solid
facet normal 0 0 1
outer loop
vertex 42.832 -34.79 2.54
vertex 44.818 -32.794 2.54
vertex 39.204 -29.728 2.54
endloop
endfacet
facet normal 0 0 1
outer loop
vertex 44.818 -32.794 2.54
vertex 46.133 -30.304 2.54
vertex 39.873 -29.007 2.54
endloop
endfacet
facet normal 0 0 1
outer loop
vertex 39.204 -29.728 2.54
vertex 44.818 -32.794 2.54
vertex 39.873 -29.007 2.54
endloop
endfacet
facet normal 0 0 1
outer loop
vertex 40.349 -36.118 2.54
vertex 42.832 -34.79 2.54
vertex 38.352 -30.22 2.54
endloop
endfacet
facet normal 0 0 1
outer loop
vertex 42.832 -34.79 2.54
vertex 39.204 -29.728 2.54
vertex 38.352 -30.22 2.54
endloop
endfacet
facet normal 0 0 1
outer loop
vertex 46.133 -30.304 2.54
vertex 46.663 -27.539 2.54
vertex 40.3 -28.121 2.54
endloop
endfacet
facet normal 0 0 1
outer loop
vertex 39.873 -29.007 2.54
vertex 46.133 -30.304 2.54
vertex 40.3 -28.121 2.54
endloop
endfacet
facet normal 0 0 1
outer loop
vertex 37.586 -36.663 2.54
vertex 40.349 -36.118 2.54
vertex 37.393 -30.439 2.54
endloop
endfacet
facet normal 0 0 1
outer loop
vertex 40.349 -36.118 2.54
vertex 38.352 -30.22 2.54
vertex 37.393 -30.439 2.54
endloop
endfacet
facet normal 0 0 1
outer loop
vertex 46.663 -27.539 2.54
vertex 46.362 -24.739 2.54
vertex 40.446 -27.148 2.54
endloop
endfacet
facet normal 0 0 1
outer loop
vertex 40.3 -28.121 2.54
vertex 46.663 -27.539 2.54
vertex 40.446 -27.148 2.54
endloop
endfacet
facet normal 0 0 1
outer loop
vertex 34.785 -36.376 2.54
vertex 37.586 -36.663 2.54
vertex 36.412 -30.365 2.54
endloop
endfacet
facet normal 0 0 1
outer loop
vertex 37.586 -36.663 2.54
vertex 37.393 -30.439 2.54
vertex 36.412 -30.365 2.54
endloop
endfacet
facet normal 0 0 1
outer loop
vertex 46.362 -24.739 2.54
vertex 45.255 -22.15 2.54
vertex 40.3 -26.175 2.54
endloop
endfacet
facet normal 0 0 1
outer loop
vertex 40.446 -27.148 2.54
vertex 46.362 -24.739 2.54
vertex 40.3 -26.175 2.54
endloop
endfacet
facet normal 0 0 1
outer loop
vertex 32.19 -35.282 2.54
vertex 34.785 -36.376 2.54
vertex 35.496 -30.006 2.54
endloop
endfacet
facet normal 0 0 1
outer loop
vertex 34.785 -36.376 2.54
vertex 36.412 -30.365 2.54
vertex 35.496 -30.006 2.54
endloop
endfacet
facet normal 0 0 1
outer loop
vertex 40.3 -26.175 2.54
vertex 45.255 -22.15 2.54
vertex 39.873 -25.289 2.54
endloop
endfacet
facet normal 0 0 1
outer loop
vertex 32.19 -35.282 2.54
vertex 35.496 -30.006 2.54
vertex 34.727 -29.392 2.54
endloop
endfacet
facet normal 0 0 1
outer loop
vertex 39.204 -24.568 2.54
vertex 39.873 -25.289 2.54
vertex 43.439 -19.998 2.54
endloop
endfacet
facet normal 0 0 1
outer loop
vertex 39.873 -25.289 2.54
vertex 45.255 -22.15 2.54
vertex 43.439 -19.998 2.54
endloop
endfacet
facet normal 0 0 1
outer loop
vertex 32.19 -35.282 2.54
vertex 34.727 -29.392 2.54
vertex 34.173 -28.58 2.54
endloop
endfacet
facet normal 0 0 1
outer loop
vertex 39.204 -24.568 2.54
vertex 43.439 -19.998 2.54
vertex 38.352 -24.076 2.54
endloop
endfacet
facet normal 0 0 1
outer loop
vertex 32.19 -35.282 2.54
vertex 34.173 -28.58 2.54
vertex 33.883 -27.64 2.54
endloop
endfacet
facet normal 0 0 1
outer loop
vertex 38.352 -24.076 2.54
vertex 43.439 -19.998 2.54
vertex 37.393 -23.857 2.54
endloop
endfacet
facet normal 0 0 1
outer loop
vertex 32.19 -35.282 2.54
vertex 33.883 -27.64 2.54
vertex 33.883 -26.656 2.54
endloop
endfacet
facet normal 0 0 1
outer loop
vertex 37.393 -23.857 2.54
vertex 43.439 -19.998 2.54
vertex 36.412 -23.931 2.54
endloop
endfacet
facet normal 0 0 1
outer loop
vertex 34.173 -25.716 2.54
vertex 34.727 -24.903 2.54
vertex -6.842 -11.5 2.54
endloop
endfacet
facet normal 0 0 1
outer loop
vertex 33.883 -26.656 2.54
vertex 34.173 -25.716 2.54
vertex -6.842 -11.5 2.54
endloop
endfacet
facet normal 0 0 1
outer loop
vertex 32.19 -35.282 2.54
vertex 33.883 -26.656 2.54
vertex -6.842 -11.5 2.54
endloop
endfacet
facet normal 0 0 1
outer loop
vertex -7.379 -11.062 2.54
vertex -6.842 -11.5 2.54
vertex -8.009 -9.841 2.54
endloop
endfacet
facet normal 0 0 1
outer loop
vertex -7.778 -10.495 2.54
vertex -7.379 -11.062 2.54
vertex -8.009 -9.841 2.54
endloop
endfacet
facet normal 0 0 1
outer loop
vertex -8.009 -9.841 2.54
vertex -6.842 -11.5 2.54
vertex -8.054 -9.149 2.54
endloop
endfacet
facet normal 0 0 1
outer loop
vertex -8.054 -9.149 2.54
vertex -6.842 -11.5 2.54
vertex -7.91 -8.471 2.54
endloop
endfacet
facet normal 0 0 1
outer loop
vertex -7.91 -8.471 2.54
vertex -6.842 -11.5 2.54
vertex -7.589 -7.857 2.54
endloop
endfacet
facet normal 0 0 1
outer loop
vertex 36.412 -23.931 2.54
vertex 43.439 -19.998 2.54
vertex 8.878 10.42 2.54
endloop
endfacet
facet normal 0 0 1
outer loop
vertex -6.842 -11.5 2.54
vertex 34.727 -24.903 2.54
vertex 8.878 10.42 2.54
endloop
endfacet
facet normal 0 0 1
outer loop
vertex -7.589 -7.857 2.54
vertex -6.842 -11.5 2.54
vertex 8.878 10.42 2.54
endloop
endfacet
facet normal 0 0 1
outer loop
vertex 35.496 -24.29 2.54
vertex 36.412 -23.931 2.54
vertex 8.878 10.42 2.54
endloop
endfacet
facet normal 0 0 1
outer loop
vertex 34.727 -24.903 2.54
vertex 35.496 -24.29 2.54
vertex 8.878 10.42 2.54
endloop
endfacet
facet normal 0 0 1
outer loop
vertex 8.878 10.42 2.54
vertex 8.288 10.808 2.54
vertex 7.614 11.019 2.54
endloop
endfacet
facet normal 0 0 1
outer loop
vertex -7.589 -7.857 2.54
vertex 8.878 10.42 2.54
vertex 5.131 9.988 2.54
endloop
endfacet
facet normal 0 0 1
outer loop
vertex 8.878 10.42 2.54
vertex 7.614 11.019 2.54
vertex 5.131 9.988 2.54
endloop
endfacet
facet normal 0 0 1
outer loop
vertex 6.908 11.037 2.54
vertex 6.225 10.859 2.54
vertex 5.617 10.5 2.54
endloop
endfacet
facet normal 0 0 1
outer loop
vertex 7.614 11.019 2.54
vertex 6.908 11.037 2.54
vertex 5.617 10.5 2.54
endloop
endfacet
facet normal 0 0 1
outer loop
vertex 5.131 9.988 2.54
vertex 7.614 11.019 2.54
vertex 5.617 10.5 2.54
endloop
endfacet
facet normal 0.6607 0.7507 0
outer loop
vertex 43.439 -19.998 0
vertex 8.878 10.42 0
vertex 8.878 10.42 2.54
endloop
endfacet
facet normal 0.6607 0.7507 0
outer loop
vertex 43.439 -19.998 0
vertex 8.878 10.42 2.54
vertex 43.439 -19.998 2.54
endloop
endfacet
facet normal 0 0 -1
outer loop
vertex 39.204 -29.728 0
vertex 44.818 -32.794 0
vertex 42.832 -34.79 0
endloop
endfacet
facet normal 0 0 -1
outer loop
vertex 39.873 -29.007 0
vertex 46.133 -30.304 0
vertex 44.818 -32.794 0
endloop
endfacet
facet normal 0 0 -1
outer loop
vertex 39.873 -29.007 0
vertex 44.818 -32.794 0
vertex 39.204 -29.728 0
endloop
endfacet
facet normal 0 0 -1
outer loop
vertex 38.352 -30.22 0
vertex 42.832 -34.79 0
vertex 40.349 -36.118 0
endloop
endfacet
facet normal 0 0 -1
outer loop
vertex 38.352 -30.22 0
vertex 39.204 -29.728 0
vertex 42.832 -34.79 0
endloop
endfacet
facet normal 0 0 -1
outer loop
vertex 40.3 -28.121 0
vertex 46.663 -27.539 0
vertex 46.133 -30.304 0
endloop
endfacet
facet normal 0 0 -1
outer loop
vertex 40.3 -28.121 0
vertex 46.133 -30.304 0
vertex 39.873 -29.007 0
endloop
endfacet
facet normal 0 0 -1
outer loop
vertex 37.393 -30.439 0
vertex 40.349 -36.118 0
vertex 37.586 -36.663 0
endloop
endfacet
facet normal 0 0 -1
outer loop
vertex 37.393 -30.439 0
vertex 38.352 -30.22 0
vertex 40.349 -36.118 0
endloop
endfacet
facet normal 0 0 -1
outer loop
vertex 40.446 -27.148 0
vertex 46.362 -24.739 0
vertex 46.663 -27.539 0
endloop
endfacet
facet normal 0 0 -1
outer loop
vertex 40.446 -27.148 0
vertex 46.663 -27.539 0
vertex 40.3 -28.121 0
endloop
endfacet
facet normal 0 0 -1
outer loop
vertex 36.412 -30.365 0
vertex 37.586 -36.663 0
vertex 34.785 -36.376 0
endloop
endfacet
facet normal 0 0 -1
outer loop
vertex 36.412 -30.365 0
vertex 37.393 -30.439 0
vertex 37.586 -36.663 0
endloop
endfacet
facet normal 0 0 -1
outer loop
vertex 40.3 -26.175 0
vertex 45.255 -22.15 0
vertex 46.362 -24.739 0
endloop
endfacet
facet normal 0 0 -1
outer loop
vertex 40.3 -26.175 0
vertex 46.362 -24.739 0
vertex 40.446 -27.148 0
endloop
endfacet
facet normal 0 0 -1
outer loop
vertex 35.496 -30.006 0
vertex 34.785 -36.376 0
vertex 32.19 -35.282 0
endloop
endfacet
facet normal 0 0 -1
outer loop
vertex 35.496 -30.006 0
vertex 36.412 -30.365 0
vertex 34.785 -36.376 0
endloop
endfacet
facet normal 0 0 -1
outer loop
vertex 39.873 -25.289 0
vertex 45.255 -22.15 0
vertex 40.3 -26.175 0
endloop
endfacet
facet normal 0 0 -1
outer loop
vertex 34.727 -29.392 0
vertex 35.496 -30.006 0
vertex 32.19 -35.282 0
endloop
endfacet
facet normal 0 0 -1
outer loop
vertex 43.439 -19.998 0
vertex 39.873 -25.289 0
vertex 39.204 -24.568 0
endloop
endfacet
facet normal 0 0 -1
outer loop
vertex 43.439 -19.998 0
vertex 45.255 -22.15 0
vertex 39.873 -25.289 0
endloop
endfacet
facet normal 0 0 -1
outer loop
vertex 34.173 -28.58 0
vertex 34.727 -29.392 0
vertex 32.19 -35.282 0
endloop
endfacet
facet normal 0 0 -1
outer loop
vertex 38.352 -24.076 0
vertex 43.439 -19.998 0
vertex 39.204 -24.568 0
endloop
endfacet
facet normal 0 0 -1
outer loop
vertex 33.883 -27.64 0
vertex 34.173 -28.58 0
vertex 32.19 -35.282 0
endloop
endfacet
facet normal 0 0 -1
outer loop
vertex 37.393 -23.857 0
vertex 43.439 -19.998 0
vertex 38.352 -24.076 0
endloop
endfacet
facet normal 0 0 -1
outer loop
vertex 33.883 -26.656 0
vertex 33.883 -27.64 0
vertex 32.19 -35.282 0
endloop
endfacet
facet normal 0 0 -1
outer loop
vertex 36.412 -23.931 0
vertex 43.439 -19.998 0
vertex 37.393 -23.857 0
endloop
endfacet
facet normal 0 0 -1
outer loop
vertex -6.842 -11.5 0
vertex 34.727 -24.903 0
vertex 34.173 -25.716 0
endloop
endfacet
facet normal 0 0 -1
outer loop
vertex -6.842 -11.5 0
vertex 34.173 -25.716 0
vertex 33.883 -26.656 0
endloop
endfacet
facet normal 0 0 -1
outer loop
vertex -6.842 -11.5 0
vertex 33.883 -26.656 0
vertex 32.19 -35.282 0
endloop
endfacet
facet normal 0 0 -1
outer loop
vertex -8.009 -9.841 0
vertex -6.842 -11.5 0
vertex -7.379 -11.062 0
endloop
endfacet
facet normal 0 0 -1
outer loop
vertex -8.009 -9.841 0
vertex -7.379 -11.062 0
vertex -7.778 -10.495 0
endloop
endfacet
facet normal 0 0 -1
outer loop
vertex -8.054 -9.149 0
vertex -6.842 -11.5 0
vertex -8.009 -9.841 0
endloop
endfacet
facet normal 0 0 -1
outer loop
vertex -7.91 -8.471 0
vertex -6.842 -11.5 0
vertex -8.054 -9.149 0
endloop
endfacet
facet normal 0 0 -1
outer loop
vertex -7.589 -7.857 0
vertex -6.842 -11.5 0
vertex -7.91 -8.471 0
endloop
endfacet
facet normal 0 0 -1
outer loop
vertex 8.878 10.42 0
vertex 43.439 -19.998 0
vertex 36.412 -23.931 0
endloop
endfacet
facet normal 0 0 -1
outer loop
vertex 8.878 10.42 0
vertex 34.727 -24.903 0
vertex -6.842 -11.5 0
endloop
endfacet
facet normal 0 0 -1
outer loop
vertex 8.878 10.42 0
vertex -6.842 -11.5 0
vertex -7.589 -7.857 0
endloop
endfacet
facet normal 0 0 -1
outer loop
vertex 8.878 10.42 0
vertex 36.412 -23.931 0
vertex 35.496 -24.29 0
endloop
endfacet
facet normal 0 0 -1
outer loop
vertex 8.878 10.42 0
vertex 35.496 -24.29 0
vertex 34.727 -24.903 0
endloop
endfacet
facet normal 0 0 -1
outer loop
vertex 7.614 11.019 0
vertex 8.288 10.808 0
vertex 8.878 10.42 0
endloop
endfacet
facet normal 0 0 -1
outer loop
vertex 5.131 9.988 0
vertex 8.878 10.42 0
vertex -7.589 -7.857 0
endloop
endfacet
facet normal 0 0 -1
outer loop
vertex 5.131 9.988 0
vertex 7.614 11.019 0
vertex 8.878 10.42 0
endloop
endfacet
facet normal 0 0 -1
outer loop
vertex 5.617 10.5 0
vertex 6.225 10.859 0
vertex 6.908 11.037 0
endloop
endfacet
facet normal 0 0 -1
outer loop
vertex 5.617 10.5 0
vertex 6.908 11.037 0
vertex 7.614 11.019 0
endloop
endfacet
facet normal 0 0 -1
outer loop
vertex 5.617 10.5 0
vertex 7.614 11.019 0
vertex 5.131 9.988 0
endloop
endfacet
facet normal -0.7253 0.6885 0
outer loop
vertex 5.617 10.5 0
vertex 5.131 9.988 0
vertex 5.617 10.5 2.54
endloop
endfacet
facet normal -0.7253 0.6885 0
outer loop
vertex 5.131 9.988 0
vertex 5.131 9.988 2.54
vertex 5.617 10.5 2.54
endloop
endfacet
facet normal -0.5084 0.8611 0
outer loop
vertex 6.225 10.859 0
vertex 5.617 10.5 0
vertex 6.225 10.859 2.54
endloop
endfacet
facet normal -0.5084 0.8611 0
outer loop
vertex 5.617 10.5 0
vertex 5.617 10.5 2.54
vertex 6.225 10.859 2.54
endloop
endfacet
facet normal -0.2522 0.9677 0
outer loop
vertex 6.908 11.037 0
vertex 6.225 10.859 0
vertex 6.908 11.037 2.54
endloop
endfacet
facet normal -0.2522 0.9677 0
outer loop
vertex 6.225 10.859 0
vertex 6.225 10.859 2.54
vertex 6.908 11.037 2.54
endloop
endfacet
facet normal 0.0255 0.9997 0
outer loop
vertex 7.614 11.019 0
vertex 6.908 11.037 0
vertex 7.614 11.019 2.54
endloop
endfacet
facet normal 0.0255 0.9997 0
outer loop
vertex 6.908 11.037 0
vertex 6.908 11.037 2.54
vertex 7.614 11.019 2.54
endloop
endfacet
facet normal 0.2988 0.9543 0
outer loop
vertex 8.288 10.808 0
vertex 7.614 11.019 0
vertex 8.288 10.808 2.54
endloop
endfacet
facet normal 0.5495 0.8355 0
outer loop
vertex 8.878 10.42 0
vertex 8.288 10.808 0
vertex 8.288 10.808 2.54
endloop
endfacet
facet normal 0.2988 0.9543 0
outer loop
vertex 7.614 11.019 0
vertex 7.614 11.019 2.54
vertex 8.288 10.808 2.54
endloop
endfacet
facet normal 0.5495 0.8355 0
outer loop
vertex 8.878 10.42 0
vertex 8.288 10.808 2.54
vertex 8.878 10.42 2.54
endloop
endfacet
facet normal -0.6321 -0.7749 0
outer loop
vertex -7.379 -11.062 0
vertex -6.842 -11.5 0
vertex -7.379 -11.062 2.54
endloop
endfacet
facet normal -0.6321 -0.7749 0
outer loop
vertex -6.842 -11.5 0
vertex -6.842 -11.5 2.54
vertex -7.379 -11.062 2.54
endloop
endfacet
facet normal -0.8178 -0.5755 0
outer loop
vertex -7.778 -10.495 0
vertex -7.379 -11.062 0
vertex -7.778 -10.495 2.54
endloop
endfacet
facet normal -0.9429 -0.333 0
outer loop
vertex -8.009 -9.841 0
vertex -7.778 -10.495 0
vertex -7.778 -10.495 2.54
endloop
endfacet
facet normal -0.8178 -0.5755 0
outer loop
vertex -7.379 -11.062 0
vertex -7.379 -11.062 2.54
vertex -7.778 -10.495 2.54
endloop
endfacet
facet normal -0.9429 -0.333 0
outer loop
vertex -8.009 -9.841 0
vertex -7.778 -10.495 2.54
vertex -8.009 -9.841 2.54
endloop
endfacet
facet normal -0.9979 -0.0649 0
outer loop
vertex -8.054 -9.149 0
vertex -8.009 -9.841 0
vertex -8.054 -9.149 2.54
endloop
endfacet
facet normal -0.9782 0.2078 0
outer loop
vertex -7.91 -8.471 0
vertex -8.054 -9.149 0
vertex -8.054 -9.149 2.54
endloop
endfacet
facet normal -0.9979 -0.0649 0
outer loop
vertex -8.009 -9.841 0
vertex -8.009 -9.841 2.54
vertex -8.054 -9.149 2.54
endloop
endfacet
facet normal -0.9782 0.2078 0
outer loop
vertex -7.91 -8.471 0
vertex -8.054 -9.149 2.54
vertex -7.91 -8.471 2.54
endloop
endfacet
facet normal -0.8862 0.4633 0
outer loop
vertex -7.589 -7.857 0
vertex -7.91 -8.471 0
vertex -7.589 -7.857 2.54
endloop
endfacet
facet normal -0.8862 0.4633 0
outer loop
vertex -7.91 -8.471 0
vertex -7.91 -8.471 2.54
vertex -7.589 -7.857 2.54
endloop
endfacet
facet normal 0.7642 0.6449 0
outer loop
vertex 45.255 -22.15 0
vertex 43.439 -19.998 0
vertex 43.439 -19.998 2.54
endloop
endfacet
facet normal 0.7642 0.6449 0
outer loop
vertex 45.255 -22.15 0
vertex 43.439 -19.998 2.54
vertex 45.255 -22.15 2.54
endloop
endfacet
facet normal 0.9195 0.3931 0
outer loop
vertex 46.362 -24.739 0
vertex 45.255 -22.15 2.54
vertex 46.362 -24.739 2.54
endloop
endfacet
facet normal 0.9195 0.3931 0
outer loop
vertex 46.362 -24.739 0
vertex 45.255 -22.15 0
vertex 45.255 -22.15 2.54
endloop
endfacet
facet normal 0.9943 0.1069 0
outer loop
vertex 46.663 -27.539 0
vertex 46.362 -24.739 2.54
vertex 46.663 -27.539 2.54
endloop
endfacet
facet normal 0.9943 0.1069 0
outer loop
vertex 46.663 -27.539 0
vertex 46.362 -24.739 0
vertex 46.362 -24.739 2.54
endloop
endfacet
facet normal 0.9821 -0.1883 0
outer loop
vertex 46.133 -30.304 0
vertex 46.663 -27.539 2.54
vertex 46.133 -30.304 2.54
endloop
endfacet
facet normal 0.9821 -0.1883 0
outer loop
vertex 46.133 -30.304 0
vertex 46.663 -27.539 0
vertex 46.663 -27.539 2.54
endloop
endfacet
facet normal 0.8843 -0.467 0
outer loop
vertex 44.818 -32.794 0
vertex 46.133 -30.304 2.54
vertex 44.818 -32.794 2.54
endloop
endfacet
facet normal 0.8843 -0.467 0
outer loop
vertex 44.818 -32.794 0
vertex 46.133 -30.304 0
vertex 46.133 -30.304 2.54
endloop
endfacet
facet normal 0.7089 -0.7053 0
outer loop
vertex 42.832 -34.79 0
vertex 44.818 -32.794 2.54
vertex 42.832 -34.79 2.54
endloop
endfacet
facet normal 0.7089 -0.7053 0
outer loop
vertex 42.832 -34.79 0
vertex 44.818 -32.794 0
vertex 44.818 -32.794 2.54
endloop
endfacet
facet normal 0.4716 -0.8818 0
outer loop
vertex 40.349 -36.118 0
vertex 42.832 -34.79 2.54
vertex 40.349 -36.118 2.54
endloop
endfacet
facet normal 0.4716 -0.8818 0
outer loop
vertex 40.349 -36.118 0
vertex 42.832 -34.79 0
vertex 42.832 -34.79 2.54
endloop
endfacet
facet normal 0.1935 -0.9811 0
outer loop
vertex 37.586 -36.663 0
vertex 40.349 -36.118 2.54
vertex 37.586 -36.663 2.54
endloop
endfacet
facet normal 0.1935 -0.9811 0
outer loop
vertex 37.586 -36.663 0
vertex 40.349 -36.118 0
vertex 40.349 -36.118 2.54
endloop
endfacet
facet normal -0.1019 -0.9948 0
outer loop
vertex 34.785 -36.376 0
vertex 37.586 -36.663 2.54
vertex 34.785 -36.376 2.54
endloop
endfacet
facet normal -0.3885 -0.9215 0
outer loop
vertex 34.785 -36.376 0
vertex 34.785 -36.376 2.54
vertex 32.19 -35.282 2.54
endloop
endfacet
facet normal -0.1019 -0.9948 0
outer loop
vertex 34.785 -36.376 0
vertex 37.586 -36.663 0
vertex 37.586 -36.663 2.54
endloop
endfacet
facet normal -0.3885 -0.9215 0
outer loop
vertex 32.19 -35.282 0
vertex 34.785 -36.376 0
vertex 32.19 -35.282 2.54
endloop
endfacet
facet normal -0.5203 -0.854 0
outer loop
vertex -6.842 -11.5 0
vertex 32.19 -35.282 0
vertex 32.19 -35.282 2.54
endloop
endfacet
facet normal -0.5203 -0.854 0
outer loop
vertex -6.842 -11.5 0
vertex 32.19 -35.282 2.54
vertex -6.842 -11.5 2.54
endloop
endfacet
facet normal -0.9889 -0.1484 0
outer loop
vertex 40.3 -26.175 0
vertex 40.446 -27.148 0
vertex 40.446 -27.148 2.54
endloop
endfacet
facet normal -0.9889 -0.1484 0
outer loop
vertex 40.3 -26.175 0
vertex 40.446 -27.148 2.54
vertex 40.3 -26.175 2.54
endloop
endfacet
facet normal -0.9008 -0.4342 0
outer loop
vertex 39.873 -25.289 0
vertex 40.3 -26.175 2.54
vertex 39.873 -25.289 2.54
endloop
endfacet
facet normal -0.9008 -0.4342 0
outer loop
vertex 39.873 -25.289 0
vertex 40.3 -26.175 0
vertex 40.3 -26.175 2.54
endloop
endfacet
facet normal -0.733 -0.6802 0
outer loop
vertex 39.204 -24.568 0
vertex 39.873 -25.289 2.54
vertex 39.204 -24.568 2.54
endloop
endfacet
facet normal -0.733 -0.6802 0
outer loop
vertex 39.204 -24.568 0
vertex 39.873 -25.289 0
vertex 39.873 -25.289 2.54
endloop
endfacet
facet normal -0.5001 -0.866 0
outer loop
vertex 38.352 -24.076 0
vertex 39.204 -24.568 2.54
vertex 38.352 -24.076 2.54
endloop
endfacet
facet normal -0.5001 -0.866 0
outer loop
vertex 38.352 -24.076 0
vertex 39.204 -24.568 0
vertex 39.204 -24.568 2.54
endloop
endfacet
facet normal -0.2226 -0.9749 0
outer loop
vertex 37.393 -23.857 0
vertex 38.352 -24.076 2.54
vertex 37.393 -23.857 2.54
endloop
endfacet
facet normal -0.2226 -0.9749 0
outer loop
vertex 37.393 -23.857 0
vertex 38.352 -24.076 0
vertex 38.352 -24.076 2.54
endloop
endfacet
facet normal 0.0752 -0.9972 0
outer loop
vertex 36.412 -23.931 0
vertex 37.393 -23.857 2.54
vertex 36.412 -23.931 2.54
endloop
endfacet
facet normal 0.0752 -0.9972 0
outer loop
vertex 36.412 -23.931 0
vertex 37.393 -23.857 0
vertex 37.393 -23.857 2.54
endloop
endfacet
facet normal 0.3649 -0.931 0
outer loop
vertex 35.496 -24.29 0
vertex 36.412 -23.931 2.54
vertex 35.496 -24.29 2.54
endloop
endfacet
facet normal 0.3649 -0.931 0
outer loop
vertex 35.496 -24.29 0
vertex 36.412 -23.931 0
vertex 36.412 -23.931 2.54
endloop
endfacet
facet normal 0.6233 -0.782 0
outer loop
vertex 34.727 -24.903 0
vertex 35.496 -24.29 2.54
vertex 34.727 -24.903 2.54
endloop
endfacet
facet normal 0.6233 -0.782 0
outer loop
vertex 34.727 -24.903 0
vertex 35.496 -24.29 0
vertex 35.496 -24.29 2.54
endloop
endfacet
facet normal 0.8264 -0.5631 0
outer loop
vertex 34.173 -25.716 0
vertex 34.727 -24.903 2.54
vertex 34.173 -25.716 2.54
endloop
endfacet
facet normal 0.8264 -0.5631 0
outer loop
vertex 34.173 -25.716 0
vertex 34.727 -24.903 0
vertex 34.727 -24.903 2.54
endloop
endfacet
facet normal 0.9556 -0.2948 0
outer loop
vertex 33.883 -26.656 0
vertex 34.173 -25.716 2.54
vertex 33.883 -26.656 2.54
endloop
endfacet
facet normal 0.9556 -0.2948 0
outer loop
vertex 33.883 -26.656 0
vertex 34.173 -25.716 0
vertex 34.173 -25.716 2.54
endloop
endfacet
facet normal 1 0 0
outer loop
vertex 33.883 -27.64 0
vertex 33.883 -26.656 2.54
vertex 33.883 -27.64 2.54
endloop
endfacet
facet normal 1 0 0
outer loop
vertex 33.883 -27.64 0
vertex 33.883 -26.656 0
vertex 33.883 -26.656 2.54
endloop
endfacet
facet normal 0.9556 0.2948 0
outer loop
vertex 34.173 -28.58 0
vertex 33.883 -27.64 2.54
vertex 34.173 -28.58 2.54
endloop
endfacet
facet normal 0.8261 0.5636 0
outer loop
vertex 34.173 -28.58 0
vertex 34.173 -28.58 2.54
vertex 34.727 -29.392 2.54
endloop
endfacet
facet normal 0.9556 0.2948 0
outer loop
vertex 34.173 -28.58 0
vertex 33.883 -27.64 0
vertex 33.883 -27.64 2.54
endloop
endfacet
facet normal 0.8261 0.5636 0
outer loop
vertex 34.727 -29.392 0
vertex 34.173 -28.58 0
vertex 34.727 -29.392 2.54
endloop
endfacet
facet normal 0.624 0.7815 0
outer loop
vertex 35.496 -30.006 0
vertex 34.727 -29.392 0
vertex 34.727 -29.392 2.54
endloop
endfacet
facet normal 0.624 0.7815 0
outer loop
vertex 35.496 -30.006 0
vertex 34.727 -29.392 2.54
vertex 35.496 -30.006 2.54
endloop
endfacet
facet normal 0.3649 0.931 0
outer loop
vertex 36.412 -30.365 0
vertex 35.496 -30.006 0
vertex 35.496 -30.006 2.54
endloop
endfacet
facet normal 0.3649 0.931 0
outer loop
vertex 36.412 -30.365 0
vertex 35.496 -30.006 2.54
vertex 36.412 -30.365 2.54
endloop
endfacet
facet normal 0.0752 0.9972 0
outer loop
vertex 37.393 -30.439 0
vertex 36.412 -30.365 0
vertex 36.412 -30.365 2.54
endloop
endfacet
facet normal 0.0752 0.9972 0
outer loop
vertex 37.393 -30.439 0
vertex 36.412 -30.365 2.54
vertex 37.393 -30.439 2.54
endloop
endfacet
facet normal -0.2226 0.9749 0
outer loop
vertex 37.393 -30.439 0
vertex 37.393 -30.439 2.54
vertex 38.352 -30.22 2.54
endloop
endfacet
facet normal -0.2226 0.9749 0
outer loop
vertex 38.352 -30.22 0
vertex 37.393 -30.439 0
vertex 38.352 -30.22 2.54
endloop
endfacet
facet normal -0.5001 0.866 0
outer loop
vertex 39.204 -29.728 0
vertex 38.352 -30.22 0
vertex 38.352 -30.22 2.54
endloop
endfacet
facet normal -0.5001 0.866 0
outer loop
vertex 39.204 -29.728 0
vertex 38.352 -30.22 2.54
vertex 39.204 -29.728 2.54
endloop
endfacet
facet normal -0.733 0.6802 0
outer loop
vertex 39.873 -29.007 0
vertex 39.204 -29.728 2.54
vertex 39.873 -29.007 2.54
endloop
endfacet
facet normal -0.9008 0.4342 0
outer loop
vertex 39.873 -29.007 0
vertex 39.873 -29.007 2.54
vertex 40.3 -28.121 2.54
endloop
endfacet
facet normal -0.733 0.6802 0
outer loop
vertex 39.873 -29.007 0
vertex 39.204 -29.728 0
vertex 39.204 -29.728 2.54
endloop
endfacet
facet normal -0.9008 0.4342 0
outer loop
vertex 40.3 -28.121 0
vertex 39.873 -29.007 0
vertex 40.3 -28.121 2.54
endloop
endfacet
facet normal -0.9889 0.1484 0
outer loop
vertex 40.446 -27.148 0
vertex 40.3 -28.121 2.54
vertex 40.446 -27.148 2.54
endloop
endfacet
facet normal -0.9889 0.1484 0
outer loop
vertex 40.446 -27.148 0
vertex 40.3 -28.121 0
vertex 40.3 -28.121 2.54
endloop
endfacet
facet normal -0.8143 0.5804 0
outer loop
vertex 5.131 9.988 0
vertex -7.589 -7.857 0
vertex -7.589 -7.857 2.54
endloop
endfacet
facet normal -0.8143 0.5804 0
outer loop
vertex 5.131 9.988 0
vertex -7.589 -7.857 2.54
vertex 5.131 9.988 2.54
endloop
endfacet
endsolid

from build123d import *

# Parameters (mm, degrees)
SKETCH1_R           = 3.3
BOSS_EXTRUDE3_DEPTH = 2.54
FILLET1_R           = 2.54
FILLET2_R           = 2.54


with BuildPart() as part:
    # Sketch1 → Boss-Extrude3 (new body)
    with BuildSketch(Plane.XY):
        with BuildLine():
            Line((32.190295112, -35.281999932), (-9.173256028, -10.079873667))
            Line((-9.173256028, -10.079873667), (6.764957958, 12.279616129))
            Line((6.764957958, 12.279616129), (43.439198939, -19.997724209))
            ThreePointArc((43.439198939, -19.997724209), (44.817595988, -32.793810869), (32.190295112, -35.281999932))
        make_face()
        with Locations((37.146277839, -27.14788288)):
            Circle(SKETCH1_R, mode=Mode.SUBTRACT)
    extrude(amount=BOSS_EXTRUDE3_DEPTH)

    # Fillet1
    fillet1_edges = [part.edges().sort_by_distance(p)[0] for p in [
        (-9.173256028, -10.079873667, 1.27),
    ]]
    fillet(fillet1_edges, radius=FILLET1_R)

    # Fillet2
    fillet2_edges = [part.edges().sort_by_distance(p)[0] for p in [
        (6.764957958, 12.279616129, 1.27),
    ]]
    fillet(fillet2_edges, radius=FILLET2_R)


solid = part.part
